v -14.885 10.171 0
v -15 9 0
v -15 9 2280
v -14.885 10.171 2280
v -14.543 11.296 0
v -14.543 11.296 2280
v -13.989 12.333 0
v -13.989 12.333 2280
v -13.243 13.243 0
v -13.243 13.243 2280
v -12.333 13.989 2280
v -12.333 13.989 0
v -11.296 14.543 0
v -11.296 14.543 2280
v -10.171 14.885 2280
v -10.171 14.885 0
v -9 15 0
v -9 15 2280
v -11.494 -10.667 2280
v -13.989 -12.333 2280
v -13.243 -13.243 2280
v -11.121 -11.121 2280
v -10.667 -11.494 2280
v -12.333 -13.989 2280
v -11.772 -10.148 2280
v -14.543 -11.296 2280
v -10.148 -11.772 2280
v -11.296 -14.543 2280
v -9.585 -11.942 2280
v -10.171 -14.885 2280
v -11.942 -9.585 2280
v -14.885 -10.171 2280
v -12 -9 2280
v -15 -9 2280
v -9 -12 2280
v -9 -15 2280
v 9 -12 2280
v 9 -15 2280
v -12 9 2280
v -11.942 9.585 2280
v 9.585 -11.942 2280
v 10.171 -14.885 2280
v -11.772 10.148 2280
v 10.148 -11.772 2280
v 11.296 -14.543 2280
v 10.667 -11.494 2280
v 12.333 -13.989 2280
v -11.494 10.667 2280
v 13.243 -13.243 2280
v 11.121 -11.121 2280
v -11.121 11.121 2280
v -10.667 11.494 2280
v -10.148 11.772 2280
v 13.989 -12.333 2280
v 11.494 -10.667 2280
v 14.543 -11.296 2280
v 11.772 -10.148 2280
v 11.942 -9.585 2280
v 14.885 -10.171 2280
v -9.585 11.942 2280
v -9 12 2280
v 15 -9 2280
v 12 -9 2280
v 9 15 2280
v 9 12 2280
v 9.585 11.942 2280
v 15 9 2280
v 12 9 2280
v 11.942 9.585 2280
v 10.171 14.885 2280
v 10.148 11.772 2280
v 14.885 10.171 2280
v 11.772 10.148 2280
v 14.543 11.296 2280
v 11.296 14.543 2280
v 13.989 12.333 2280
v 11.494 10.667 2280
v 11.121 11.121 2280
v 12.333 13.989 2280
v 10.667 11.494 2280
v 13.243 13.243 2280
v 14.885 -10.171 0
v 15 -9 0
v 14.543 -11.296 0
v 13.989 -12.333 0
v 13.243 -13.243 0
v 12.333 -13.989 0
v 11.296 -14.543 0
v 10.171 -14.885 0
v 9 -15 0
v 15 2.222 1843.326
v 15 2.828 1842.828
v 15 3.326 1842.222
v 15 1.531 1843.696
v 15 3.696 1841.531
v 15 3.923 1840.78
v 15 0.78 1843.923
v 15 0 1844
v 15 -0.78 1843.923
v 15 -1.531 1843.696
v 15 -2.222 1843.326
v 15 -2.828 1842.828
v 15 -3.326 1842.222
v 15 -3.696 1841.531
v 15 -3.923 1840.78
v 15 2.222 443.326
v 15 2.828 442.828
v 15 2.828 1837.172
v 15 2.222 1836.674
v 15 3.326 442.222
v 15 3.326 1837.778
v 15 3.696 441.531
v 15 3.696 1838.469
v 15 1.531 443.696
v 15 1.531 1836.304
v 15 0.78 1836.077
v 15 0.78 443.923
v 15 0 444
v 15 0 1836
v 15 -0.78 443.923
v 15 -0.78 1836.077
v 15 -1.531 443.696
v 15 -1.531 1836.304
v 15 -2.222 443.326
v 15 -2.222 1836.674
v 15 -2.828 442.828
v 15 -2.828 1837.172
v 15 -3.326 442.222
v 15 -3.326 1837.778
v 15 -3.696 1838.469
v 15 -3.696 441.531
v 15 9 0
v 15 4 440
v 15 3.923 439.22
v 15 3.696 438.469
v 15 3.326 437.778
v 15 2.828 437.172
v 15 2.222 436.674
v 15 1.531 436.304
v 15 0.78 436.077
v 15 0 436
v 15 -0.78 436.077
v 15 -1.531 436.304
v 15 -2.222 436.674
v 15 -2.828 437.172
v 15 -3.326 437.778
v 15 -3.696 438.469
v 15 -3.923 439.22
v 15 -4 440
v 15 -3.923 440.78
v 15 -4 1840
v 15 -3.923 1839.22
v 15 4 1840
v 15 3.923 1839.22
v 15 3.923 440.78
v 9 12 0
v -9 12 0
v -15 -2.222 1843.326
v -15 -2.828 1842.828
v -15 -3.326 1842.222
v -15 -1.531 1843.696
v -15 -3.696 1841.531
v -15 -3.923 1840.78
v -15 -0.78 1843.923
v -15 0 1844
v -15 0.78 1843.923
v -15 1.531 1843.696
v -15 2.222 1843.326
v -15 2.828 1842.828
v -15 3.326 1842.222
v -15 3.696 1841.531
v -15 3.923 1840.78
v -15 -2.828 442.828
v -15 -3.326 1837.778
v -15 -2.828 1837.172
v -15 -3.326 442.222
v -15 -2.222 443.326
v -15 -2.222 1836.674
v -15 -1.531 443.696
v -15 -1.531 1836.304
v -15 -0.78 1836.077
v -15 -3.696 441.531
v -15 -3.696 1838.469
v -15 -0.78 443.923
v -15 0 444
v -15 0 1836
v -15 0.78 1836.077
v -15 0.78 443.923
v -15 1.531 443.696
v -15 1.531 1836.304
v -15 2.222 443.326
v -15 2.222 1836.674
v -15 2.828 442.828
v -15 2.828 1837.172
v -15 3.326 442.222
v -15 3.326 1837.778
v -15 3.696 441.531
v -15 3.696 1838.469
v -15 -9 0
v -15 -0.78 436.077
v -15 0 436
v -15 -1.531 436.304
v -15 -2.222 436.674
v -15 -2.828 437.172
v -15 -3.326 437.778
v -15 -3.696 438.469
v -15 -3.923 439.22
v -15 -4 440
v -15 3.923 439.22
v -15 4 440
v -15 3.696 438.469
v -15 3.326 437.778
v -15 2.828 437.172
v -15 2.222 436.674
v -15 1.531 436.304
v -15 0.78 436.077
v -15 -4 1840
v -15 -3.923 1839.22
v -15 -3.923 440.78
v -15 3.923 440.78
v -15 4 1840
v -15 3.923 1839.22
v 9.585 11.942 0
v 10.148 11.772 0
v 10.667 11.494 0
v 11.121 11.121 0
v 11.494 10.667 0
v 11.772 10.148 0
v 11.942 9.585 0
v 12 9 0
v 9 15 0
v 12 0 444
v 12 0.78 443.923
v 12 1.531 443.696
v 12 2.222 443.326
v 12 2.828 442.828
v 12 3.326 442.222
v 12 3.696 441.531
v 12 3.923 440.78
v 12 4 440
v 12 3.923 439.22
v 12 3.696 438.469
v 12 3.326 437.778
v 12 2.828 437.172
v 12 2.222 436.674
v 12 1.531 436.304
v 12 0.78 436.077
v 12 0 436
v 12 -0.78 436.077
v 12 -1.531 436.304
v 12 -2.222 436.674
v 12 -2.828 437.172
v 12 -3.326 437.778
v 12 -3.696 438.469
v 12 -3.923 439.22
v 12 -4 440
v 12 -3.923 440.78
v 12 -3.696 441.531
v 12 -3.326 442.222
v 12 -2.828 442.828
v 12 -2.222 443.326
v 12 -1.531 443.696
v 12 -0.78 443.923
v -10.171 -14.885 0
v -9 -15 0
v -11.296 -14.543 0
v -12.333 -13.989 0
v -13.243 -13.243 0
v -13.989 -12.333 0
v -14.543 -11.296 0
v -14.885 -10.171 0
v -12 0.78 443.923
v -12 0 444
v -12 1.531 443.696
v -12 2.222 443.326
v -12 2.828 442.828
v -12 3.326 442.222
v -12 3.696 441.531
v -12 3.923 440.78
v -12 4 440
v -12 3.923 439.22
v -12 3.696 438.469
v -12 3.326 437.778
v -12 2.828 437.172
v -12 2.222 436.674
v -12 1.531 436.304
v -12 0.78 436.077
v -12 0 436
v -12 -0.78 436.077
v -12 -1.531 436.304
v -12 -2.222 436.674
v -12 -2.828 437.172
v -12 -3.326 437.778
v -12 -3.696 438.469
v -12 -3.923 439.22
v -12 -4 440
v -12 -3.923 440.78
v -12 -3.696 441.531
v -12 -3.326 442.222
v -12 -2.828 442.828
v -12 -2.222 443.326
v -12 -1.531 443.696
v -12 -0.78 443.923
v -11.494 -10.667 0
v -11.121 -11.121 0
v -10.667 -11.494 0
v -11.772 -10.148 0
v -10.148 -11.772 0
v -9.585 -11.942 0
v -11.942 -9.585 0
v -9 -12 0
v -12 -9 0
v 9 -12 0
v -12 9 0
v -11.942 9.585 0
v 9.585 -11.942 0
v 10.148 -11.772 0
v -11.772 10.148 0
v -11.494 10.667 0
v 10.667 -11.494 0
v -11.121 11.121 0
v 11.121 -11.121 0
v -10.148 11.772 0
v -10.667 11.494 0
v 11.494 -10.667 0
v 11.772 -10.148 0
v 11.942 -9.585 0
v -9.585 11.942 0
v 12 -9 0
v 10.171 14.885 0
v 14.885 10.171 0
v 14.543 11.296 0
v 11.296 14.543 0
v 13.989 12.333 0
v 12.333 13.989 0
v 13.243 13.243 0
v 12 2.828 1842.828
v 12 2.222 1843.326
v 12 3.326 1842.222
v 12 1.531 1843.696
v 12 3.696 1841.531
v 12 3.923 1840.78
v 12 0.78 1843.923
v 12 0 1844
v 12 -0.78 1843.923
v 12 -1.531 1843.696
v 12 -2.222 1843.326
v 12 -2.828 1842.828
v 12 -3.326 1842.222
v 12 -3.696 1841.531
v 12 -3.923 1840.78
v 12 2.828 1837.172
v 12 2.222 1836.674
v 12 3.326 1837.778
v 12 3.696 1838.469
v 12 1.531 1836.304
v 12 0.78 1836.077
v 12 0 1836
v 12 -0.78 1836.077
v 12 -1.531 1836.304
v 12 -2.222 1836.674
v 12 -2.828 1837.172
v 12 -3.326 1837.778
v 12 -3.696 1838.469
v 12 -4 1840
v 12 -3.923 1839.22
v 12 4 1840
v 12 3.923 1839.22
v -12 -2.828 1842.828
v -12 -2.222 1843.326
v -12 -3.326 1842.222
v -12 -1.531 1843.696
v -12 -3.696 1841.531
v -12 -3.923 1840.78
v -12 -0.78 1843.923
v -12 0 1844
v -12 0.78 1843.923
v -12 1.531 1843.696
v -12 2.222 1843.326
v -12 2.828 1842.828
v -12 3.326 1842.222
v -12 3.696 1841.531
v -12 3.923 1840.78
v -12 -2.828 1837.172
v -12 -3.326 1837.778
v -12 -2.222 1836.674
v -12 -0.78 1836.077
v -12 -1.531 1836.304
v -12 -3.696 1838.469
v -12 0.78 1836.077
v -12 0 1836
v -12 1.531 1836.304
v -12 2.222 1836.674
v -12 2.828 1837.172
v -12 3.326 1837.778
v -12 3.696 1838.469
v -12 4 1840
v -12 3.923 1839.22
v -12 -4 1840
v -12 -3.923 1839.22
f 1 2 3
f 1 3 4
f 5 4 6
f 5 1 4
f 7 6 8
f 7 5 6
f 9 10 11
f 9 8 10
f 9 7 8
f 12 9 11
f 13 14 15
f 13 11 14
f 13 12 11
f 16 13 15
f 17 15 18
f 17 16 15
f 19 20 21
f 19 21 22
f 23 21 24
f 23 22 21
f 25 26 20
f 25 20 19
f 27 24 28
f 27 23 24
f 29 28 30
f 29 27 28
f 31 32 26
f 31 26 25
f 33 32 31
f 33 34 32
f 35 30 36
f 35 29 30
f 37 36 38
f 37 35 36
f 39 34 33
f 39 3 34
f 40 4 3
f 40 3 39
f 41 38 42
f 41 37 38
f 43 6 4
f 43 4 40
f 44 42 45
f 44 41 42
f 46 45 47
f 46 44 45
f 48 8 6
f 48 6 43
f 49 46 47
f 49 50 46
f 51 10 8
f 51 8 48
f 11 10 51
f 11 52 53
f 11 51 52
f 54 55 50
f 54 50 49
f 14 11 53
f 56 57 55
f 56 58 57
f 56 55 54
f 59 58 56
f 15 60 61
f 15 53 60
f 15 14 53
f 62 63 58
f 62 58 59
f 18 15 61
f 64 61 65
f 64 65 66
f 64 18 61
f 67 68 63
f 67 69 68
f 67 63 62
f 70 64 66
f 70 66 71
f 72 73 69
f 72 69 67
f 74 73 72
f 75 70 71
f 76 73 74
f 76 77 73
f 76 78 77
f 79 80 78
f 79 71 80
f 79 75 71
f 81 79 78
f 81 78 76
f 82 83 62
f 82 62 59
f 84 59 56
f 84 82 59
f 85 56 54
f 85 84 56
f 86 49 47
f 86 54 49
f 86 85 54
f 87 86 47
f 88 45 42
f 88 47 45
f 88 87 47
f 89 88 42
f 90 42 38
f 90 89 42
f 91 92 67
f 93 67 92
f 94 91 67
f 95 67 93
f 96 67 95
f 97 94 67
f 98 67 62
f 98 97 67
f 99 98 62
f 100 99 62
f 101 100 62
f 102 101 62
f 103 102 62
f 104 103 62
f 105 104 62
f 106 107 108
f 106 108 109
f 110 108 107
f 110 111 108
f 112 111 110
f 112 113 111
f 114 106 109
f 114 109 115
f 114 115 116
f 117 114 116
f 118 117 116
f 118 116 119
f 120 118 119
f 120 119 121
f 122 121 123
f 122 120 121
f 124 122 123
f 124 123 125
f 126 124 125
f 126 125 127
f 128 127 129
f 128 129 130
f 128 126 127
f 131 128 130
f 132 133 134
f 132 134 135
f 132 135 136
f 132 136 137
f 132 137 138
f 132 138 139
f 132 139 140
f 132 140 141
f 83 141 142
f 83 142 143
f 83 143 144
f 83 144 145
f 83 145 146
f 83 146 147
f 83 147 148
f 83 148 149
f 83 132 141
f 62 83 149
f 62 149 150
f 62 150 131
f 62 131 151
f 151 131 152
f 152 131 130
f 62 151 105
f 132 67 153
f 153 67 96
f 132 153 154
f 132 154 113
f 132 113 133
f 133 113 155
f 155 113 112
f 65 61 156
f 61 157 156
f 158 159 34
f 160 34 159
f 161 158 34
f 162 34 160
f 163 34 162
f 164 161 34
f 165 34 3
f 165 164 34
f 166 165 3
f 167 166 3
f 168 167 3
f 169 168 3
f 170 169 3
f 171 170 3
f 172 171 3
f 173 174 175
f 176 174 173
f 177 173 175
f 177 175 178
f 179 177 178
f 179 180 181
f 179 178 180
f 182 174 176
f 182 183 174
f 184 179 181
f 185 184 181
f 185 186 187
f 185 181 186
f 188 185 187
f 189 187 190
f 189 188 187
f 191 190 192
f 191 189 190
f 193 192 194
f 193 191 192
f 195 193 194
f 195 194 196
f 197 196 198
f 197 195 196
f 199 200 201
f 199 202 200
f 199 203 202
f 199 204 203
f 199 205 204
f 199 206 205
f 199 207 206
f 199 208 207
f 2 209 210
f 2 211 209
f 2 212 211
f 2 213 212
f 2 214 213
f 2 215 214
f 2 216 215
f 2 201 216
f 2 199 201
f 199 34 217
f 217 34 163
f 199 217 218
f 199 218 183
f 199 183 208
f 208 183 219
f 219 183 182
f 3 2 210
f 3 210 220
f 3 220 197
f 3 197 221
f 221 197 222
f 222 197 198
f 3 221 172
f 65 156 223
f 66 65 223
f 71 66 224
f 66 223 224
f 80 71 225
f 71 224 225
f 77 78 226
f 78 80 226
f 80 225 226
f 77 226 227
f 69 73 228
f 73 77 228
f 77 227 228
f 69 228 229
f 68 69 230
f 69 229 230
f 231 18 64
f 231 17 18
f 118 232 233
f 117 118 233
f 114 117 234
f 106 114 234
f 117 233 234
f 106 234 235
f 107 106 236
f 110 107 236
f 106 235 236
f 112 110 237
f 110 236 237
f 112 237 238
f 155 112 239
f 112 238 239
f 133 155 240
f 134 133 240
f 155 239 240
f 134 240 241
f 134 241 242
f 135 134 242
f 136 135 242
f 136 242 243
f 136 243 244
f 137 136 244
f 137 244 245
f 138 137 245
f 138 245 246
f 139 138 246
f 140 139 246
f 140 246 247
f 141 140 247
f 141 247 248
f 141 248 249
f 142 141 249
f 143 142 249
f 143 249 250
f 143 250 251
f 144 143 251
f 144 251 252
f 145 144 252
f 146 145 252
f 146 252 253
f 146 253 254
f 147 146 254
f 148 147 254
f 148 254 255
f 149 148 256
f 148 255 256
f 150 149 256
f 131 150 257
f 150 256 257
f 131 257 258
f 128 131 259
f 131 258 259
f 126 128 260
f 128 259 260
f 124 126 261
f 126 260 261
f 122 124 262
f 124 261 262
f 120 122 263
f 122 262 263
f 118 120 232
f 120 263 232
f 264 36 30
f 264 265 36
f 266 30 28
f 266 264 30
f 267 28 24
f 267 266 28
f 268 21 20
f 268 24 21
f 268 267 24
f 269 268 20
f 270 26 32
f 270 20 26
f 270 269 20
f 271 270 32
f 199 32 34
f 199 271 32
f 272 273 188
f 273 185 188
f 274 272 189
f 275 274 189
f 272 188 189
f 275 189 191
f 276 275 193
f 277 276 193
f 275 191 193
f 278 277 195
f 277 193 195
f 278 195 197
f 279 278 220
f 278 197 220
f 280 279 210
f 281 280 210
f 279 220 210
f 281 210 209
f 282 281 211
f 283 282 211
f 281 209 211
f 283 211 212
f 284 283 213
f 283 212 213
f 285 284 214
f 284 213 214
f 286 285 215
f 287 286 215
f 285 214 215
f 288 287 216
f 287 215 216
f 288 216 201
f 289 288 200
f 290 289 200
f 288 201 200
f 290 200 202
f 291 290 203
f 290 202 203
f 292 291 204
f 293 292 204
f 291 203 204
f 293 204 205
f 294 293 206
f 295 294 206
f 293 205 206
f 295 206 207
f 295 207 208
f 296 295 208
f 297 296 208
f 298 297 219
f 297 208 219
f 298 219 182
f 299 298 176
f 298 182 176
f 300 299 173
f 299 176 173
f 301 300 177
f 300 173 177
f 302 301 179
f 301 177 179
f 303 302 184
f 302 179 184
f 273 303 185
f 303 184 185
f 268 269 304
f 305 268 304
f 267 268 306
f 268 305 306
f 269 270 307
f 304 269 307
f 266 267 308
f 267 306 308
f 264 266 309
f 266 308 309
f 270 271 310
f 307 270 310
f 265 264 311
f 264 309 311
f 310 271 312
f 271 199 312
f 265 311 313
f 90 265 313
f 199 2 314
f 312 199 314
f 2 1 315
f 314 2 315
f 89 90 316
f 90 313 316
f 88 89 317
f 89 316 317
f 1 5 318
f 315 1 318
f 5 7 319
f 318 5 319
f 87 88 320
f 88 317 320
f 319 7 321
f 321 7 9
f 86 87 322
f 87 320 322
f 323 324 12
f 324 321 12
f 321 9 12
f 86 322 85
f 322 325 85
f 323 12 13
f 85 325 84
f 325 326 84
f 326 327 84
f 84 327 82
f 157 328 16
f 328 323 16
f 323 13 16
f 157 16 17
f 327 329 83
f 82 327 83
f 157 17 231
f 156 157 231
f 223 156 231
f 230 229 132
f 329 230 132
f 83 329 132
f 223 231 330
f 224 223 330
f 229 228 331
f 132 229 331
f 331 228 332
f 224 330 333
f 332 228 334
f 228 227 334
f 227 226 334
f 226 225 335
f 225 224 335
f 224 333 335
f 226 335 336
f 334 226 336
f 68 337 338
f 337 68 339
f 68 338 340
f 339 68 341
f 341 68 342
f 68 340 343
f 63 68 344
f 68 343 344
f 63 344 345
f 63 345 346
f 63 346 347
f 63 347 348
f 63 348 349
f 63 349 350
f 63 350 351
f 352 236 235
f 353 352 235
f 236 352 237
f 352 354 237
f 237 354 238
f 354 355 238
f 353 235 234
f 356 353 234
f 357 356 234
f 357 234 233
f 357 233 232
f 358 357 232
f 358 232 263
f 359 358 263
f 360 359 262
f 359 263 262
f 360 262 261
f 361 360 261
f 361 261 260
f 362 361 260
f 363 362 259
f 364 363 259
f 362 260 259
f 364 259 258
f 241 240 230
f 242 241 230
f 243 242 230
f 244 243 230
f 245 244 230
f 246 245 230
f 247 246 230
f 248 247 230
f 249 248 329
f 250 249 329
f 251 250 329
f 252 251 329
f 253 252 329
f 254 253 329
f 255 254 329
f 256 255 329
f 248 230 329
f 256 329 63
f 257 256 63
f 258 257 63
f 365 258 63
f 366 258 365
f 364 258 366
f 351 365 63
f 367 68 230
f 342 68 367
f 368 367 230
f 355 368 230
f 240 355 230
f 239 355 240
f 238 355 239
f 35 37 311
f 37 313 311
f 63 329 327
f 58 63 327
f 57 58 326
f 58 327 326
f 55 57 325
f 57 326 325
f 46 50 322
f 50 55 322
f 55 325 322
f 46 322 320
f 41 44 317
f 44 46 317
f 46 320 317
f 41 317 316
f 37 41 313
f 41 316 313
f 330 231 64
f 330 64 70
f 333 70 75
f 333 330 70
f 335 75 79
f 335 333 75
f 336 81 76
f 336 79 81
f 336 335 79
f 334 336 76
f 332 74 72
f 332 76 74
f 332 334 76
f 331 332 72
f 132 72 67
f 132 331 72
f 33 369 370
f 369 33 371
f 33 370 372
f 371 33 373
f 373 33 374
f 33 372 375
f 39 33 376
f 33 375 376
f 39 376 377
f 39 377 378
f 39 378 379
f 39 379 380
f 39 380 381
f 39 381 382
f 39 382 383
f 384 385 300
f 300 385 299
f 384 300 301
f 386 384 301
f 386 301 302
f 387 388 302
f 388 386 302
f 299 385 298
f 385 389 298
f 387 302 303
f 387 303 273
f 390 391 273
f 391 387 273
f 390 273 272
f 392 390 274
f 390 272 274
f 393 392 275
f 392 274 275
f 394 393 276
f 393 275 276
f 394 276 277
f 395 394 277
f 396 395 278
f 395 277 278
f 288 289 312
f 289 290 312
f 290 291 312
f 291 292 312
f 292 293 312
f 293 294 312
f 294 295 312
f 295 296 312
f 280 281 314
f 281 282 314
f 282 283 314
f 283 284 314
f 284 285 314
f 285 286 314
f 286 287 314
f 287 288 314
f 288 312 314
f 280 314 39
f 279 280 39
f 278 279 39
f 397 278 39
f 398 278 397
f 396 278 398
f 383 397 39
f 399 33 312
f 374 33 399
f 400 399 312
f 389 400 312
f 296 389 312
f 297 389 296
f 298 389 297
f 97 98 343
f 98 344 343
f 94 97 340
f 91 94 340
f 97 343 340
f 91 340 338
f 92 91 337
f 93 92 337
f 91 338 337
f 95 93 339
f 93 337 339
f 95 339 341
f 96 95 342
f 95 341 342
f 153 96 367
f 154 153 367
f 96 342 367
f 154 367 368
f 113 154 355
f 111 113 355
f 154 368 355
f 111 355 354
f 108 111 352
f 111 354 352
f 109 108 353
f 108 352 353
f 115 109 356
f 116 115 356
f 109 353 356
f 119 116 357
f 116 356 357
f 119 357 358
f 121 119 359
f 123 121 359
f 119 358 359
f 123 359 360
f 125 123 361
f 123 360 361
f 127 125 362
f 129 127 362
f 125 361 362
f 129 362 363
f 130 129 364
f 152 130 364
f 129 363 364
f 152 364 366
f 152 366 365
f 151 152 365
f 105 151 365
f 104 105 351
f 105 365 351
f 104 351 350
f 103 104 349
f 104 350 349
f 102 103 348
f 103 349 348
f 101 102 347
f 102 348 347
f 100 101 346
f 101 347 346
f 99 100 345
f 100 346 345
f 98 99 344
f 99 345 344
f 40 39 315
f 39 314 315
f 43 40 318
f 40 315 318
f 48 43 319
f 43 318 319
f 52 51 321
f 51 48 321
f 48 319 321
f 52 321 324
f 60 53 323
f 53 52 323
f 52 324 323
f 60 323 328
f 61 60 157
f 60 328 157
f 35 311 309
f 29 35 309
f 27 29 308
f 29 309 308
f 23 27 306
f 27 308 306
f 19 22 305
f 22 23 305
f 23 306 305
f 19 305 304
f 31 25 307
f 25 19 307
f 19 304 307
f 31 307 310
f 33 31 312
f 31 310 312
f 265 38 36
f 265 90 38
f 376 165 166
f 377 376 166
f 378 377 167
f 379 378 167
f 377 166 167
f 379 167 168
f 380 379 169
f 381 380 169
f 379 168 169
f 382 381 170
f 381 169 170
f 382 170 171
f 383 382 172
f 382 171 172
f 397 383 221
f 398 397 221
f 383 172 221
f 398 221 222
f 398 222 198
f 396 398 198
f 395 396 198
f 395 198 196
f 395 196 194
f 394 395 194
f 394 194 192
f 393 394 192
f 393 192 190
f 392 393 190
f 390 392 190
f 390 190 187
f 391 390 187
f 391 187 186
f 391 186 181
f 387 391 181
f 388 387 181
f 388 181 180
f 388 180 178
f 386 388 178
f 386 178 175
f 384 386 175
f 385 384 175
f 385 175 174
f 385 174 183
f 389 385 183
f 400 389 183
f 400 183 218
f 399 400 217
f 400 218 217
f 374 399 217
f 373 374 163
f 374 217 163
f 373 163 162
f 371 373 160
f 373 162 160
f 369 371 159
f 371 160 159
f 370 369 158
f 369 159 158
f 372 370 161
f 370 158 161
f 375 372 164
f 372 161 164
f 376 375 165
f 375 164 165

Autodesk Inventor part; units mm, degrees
ref_plane "YZ Plane" through (0, 0, 0) normal (1, 0, 0) x (0, 1, 0)
ref_plane "Plano inicial" through (0, 0, 0) normal (0, 0, 1) x (1, 0, 0)
ref_plane "Plano final" through (0, 0, 2280) normal (0, 0, 1) x (1, 0, 0)
sketch "Rascunho" plane through (0, 0, 0) normal (0, 0, 1) x (1, 0, 0)
  line L0 (-15, -9) -> (-15, 9)
  line L1 (-9, 15) -> (9, 15)
  line L2 (15, 9) -> (15, -9)
  line L3 (9, -15) -> (-9, -15)
  arc A0 (-15, -9) -> (-9, -15) centre (-9, -9) ccw
  arc A1 (15, 9) -> (9, 15) centre (9, 9) ccw
  arc A2 (-9, 15) -> (-15, 9) centre (-9, 9) ccw
  arc A3 (9, -15) -> (15, -9) centre (9, -9) ccw
  arc A4 (-9, 12) -> (-12, 9) centre (-9, 9) ccw
  line L4 (-9, 12) -> (9, 12)
  arc A5 (12, 9) -> (9, 12) centre (9, 9) ccw
  line L5 (12, 9) -> (12, -9)
  arc A6 (9, -12) -> (12, -9) centre (9, -9) ccw
  line L6 (9, -12) -> (-9, -12)
  arc A7 (-12, -9) -> (-9, -12) centre (-9, -9) ccw
  line L7 (-12, -9) -> (-12, 9)
  line L8 (0, 22.7397) -> (0, -22.7397) construction
  line L9 (-22.7397, 0) -> (22.7397, 0) construction
  dimension "d7" = 6
  dimension "d9" = 30
  dimension "d11" = 30
  dimension "d12" = 3
  dimension "d15" = 15
  dimension "d16" = 15
extrude "Corpo" add sketch "Rascunho" along normal up to surface (2280 mm away) from surface at 0
sketch "Sketch3" plane through (0, 0, 0) normal (0, 0, 1) x (1, 0, 0)
  line L0 (0, 0) -> (10, 0)
ref_plane "Work Plane3" through (0, 0, 0) normal (0, -1, 0) x (1, 0, 0)
sketch "Esboço5" plane through (-9, -15, 2280) normal (0, 0, 1) x (1, 0, 0)
  point P0 (9, 15)
sketch "Esboço7" plane through (-15, 9, 0) normal (-1, 0, 0) x (0, 0, 1)
  line L0 (2280, -53.7835) -> (2280, 35.3668)
  circle A0 centre (1840, -9) radius 4
  line L1 (1862, -56.2056) -> (1862, 46.17)
  line L2 (1822, -56.2056) -> (1822, 46.17)
  line L3 (0, -24) -> (2280, -24) projected
  circle A1 centre (440, -9) radius 4
  line L4 (0, -18) -> (0, 0) projected
  point P0 (0, -9)
  dimension "d23" = 8
  dimension "d24" = 440
  dimension "d27" = 40
  dimension "d28" = 15
  dimension "d29" = 8
  dimension "d30" = 440
  dimension "d31" = 15
extrude "Extrusão3" cut sketch "Esboço7" against normal through all
sketch "Sketch4" plane through (0, 0, 0) normal (0, -1, 0) x (1, 0, 0)
  line L0 (-2, 0) -> (12, 0) projected
  line L1 (-2, 2280) -> (12, 2280) projected
  dimension "d18" = 2280
equation "\"d7\" = G_IR"
equation "\"d9\" = G_W"
equation "\"d11\" = G_H"
equation "\"d12\" = G_T"
equation "\"d15\" = 0.5 * d9"
equation "\"d16\" = 0.5 * d11"
equation "\"d3\" = G_L"
equation "\"G_W\" = 30"
equation "\"G_H\" = 30"
equation "\"G_T\" = 3"
equation "\"G_IR\" = 6"
equation "\"G_L\" = d18"
equation "\"G_OFFSET_START\" = 0"
equation "\"G_OFFSET_END\" = 0"
properties part number "Perfil tubo - 30x30x3 - 2280" material "Aço, suave"
